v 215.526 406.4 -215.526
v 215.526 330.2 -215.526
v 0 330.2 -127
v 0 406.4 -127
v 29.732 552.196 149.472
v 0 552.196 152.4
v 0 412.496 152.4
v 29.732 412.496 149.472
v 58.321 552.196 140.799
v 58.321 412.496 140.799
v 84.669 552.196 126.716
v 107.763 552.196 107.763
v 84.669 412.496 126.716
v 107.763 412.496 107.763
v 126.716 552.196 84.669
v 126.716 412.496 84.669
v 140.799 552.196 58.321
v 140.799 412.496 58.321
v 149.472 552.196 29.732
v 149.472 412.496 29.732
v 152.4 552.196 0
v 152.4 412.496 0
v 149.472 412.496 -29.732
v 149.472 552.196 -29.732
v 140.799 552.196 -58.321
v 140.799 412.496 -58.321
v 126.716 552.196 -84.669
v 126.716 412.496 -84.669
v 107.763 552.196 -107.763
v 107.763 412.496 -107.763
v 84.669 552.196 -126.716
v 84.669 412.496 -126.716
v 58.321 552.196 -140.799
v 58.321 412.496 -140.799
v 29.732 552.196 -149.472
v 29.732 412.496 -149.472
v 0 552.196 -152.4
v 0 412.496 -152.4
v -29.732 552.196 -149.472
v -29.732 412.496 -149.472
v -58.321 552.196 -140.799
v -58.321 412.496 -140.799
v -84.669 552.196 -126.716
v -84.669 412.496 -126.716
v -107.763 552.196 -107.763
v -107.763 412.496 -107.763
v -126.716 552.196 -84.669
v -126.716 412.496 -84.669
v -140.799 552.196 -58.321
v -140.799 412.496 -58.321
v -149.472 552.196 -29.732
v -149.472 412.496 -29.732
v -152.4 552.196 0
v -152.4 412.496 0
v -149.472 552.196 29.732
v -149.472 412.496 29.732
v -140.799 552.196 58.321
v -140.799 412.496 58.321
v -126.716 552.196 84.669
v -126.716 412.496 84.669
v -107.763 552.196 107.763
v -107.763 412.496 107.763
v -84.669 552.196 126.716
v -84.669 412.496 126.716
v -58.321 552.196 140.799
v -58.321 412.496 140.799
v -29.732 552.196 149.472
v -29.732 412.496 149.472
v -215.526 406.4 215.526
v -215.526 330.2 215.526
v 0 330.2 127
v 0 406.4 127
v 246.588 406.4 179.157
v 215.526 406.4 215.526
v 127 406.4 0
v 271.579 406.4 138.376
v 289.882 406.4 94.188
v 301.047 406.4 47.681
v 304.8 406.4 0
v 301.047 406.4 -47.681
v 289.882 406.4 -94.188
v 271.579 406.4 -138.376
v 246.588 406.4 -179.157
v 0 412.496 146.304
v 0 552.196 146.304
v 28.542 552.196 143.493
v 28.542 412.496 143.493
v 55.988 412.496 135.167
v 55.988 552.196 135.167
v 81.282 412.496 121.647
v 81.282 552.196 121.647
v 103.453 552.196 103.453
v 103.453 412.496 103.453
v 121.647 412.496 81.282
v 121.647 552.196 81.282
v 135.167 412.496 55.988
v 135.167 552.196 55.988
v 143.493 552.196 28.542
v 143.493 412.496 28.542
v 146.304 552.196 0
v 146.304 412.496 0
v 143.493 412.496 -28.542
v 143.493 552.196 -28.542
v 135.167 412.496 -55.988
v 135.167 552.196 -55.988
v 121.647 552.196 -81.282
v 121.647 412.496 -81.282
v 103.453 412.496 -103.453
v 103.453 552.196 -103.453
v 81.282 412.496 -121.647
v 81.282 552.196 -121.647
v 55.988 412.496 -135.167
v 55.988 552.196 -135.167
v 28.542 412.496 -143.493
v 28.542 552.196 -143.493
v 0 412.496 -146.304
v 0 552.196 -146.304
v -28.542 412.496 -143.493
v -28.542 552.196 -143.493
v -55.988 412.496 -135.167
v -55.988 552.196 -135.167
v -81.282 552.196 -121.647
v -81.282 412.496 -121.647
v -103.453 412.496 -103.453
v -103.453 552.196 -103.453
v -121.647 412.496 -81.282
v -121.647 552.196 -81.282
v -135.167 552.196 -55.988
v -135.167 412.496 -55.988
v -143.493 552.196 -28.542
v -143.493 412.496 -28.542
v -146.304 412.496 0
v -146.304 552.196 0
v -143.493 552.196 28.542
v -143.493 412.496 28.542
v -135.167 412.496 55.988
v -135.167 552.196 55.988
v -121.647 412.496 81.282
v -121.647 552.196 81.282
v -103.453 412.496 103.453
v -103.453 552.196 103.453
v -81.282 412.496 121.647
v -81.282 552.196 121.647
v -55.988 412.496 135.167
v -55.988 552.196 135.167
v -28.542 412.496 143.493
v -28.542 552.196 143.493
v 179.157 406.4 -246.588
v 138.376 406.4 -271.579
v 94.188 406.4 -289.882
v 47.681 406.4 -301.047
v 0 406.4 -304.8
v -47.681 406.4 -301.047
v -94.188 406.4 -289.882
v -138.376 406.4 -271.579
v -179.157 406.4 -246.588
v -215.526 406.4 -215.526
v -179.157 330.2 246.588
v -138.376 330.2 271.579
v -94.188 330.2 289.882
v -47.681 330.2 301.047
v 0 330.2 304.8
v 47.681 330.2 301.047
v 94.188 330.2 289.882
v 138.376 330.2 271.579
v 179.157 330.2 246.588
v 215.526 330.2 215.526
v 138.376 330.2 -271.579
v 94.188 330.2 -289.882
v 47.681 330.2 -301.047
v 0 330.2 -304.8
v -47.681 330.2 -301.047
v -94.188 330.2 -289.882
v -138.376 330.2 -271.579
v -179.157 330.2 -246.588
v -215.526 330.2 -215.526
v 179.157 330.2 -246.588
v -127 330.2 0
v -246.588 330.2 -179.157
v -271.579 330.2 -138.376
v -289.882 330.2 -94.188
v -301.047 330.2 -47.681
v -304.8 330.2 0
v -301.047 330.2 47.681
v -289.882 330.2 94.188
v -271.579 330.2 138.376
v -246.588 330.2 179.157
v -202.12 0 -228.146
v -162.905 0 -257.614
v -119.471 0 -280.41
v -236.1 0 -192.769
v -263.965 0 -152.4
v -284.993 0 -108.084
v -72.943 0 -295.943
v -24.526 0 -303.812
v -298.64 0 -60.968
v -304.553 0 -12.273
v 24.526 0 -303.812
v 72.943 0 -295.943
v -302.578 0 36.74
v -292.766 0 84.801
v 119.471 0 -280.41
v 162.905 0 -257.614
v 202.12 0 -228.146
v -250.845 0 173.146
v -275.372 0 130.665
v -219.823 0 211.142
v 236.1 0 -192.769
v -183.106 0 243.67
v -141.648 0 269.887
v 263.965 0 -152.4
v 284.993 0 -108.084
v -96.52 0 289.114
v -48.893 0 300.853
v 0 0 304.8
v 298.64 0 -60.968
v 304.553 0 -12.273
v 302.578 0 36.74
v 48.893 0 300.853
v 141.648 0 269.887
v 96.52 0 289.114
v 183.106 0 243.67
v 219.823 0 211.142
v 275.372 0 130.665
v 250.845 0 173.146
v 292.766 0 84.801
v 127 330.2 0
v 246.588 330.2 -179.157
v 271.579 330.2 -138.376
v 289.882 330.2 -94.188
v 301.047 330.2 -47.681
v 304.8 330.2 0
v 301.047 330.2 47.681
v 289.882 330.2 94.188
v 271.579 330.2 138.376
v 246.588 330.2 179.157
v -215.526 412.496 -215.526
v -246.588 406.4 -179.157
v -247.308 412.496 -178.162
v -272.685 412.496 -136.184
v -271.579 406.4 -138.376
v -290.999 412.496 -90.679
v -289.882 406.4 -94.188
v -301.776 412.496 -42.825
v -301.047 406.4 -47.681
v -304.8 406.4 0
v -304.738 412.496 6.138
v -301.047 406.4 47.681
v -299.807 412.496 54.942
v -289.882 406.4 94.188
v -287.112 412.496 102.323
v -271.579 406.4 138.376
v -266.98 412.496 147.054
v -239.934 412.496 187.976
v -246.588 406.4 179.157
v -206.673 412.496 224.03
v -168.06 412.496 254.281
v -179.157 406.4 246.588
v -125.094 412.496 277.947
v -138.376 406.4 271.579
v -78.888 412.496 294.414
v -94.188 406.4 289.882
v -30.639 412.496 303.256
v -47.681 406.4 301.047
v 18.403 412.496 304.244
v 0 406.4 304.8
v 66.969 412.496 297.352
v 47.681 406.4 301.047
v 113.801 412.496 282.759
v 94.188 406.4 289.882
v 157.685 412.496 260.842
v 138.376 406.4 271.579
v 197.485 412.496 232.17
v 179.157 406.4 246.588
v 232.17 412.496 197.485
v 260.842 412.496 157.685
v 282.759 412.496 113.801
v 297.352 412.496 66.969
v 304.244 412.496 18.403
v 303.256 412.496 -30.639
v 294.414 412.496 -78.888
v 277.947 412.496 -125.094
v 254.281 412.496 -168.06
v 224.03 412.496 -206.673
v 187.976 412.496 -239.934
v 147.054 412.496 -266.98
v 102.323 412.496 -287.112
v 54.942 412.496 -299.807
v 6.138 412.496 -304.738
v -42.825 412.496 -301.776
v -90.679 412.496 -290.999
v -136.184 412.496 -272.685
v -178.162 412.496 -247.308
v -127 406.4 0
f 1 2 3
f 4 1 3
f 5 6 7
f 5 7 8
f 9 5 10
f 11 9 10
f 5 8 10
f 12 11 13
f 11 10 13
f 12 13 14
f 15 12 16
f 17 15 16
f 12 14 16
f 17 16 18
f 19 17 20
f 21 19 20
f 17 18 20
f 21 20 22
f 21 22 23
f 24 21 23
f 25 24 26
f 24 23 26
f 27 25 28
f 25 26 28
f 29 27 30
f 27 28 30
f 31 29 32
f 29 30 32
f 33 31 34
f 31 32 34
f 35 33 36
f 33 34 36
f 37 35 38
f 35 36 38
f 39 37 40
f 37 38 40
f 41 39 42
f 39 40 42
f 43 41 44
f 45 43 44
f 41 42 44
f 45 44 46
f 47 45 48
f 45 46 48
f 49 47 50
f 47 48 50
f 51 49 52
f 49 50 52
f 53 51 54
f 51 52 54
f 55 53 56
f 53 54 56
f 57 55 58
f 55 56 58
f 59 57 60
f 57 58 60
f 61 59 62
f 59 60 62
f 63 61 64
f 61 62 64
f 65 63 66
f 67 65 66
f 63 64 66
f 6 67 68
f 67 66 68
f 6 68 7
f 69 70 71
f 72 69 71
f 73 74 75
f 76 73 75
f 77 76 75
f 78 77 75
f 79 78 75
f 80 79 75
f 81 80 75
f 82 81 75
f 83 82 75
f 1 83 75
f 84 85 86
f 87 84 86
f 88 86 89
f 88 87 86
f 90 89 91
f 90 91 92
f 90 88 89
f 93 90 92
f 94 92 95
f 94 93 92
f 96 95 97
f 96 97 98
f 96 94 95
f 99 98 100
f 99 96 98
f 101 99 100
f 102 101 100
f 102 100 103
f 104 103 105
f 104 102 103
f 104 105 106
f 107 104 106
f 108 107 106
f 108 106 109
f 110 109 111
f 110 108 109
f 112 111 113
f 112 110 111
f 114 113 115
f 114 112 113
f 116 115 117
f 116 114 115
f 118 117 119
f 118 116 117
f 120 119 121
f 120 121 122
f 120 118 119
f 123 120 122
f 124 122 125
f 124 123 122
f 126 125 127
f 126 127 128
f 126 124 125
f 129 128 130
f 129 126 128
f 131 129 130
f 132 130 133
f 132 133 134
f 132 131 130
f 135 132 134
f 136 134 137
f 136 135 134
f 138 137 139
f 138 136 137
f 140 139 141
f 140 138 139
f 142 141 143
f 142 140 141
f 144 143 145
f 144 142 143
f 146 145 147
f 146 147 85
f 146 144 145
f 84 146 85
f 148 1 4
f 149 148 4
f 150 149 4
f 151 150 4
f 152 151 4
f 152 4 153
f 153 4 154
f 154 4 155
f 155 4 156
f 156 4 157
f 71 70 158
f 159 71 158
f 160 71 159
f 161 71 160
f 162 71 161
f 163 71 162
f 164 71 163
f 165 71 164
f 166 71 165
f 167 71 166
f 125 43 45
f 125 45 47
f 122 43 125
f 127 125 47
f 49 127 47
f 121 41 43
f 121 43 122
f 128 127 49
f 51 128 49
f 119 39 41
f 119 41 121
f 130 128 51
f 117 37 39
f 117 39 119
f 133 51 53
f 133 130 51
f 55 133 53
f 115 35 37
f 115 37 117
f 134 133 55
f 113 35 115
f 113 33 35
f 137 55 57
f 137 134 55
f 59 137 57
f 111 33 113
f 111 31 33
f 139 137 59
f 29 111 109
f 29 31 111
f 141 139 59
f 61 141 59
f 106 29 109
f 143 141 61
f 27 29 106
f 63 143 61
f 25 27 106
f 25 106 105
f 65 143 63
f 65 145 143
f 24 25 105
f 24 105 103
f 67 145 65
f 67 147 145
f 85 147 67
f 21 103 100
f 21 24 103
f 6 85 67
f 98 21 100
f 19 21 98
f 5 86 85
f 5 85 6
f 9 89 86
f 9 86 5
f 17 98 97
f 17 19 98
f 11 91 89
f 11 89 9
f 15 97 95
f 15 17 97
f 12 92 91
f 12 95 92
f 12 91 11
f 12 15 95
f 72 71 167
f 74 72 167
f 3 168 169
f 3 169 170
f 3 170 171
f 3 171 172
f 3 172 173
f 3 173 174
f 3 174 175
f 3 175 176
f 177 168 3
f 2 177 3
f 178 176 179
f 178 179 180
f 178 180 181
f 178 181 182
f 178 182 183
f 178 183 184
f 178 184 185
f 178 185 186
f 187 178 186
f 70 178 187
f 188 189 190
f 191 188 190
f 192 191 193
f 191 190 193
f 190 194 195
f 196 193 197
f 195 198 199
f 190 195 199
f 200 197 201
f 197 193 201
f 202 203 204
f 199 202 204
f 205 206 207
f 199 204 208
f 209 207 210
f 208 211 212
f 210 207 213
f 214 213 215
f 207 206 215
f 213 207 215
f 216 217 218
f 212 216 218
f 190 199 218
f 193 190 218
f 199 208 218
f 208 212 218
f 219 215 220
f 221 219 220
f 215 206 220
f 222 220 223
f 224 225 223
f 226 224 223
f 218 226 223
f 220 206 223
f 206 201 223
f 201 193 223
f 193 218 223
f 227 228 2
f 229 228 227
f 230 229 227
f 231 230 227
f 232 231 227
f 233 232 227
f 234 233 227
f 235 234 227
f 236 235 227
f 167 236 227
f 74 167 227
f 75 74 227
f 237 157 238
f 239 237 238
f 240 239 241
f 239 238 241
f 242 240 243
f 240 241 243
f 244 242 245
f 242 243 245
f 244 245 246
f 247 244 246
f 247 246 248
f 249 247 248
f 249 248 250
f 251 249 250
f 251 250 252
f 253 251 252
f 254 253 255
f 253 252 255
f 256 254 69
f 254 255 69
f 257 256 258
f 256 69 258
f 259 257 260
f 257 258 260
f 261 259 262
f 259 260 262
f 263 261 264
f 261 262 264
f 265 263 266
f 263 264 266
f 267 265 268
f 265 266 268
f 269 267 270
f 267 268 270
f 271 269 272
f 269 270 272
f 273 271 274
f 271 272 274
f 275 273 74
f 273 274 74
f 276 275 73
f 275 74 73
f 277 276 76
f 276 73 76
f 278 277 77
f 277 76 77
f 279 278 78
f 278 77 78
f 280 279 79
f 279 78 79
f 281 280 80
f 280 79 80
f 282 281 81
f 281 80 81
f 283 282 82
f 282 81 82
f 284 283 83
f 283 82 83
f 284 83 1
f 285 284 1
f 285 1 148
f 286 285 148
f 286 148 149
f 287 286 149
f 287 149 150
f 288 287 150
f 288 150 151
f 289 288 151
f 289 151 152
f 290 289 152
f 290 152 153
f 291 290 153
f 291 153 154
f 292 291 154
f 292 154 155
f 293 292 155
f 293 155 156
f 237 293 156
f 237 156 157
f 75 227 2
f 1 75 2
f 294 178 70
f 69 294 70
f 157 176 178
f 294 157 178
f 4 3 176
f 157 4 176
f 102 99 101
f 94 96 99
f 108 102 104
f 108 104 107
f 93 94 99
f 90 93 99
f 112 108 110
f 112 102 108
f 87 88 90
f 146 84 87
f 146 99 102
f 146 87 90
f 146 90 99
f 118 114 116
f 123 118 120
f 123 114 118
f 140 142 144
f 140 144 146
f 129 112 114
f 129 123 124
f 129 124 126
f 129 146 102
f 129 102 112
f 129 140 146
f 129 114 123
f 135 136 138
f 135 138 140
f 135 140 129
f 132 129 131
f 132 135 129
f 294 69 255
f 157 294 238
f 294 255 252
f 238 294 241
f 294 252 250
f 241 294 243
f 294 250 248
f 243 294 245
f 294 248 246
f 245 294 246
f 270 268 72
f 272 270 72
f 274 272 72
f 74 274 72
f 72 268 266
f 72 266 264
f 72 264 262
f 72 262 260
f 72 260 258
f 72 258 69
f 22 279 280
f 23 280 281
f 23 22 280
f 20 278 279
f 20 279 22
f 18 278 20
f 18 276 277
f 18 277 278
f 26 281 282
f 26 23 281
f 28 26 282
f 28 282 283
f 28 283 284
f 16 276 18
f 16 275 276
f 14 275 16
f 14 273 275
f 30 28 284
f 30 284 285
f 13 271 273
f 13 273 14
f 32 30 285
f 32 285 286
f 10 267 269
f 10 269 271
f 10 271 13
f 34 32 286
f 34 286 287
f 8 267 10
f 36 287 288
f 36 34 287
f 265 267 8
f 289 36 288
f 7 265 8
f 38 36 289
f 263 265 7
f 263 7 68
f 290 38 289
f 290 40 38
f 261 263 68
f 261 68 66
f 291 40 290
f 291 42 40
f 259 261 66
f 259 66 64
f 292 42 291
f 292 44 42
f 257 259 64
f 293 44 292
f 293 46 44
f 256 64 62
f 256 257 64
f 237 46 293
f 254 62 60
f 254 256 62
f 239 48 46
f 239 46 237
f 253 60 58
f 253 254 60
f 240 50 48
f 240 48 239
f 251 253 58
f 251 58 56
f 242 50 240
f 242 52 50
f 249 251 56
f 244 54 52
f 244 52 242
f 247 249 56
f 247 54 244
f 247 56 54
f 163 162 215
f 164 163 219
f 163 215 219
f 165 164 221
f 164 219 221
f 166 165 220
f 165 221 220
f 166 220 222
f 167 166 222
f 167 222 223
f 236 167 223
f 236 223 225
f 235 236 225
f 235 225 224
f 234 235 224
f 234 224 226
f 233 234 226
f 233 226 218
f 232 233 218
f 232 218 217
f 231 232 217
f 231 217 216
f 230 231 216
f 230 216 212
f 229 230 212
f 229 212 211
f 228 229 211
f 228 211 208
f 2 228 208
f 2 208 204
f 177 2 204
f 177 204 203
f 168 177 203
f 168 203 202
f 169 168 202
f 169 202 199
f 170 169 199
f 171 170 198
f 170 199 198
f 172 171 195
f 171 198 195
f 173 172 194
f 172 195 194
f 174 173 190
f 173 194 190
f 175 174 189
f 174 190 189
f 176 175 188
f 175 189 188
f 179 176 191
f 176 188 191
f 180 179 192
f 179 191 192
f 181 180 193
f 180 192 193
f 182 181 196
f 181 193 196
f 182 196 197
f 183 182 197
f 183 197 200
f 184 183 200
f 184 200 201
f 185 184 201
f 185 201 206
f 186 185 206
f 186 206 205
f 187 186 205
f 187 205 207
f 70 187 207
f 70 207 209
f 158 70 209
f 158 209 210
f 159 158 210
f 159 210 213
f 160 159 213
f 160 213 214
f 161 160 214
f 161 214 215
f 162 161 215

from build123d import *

# Parameters (mm, degrees)
SKETCH11_R          = 304.8
BOSS_EXTRUDE5_DEPTH = 330.2
BOSS_EXTRUDE6_DEPTH = 76.2
SKETCH13_R          = 304.8
BOSS_EXTRUDE7_DEPTH = 6.096
SKETCH14_R          = 152.4
SKETCH14_R_2        = 146.304
BOSS_EXTRUDE8_DEPTH = 139.7


with BuildPart() as part:
    # Sketch11 → Boss-Extrude5 (new body)
    with BuildSketch(Plane(origin=(0, 0, 0), x_dir=(1, 0, 0), z_dir=(0, 1, 0))):
        with Locations(Location((0, 0, 0), (0, 0, 270))):
            Circle(SKETCH11_R)
    extrude(amount=BOSS_EXTRUDE5_DEPTH)

    # Sketch12 → Boss-Extrude6 (add)
    with BuildSketch(Plane(origin=(0, 330.2, 0), x_dir=(1, 0, 0), z_dir=(0, 1, 0))):
        Polygon((-127, 0), (-215.526146906, -215.526146906), (0, -127), (215.526146906, -215.526146906), (127, 0), (215.526146906, 215.526146906), (0, 127), (-215.526146906, 215.526146906), align=None)
    extrude(amount=BOSS_EXTRUDE6_DEPTH)

    # Sketch13 → Boss-Extrude7 (add)
    with BuildSketch(Plane(origin=(0, 406.4, 0), x_dir=(1, 0, 0), z_dir=(0, 1, 0))):
        with Locations(Location((0, 0, 0), (0, 0, 135))):
            Circle(SKETCH13_R)
    extrude(amount=BOSS_EXTRUDE7_DEPTH)

    # Sketch14 → Boss-Extrude8 (add)
    with BuildSketch(Plane(origin=(0, 412.496, 0), x_dir=(1, 0, 0), z_dir=(0, 1, 0))):
        with Locations(Location((0, 0, 0), (0, 0, 270))):
            Circle(SKETCH14_R)
        with Locations(Location((0, 0, 0), (0, 0, 270))):
            Circle(SKETCH14_R_2, mode=Mode.SUBTRACT)
    extrude(amount=BOSS_EXTRUDE8_DEPTH)


solid = part.part
